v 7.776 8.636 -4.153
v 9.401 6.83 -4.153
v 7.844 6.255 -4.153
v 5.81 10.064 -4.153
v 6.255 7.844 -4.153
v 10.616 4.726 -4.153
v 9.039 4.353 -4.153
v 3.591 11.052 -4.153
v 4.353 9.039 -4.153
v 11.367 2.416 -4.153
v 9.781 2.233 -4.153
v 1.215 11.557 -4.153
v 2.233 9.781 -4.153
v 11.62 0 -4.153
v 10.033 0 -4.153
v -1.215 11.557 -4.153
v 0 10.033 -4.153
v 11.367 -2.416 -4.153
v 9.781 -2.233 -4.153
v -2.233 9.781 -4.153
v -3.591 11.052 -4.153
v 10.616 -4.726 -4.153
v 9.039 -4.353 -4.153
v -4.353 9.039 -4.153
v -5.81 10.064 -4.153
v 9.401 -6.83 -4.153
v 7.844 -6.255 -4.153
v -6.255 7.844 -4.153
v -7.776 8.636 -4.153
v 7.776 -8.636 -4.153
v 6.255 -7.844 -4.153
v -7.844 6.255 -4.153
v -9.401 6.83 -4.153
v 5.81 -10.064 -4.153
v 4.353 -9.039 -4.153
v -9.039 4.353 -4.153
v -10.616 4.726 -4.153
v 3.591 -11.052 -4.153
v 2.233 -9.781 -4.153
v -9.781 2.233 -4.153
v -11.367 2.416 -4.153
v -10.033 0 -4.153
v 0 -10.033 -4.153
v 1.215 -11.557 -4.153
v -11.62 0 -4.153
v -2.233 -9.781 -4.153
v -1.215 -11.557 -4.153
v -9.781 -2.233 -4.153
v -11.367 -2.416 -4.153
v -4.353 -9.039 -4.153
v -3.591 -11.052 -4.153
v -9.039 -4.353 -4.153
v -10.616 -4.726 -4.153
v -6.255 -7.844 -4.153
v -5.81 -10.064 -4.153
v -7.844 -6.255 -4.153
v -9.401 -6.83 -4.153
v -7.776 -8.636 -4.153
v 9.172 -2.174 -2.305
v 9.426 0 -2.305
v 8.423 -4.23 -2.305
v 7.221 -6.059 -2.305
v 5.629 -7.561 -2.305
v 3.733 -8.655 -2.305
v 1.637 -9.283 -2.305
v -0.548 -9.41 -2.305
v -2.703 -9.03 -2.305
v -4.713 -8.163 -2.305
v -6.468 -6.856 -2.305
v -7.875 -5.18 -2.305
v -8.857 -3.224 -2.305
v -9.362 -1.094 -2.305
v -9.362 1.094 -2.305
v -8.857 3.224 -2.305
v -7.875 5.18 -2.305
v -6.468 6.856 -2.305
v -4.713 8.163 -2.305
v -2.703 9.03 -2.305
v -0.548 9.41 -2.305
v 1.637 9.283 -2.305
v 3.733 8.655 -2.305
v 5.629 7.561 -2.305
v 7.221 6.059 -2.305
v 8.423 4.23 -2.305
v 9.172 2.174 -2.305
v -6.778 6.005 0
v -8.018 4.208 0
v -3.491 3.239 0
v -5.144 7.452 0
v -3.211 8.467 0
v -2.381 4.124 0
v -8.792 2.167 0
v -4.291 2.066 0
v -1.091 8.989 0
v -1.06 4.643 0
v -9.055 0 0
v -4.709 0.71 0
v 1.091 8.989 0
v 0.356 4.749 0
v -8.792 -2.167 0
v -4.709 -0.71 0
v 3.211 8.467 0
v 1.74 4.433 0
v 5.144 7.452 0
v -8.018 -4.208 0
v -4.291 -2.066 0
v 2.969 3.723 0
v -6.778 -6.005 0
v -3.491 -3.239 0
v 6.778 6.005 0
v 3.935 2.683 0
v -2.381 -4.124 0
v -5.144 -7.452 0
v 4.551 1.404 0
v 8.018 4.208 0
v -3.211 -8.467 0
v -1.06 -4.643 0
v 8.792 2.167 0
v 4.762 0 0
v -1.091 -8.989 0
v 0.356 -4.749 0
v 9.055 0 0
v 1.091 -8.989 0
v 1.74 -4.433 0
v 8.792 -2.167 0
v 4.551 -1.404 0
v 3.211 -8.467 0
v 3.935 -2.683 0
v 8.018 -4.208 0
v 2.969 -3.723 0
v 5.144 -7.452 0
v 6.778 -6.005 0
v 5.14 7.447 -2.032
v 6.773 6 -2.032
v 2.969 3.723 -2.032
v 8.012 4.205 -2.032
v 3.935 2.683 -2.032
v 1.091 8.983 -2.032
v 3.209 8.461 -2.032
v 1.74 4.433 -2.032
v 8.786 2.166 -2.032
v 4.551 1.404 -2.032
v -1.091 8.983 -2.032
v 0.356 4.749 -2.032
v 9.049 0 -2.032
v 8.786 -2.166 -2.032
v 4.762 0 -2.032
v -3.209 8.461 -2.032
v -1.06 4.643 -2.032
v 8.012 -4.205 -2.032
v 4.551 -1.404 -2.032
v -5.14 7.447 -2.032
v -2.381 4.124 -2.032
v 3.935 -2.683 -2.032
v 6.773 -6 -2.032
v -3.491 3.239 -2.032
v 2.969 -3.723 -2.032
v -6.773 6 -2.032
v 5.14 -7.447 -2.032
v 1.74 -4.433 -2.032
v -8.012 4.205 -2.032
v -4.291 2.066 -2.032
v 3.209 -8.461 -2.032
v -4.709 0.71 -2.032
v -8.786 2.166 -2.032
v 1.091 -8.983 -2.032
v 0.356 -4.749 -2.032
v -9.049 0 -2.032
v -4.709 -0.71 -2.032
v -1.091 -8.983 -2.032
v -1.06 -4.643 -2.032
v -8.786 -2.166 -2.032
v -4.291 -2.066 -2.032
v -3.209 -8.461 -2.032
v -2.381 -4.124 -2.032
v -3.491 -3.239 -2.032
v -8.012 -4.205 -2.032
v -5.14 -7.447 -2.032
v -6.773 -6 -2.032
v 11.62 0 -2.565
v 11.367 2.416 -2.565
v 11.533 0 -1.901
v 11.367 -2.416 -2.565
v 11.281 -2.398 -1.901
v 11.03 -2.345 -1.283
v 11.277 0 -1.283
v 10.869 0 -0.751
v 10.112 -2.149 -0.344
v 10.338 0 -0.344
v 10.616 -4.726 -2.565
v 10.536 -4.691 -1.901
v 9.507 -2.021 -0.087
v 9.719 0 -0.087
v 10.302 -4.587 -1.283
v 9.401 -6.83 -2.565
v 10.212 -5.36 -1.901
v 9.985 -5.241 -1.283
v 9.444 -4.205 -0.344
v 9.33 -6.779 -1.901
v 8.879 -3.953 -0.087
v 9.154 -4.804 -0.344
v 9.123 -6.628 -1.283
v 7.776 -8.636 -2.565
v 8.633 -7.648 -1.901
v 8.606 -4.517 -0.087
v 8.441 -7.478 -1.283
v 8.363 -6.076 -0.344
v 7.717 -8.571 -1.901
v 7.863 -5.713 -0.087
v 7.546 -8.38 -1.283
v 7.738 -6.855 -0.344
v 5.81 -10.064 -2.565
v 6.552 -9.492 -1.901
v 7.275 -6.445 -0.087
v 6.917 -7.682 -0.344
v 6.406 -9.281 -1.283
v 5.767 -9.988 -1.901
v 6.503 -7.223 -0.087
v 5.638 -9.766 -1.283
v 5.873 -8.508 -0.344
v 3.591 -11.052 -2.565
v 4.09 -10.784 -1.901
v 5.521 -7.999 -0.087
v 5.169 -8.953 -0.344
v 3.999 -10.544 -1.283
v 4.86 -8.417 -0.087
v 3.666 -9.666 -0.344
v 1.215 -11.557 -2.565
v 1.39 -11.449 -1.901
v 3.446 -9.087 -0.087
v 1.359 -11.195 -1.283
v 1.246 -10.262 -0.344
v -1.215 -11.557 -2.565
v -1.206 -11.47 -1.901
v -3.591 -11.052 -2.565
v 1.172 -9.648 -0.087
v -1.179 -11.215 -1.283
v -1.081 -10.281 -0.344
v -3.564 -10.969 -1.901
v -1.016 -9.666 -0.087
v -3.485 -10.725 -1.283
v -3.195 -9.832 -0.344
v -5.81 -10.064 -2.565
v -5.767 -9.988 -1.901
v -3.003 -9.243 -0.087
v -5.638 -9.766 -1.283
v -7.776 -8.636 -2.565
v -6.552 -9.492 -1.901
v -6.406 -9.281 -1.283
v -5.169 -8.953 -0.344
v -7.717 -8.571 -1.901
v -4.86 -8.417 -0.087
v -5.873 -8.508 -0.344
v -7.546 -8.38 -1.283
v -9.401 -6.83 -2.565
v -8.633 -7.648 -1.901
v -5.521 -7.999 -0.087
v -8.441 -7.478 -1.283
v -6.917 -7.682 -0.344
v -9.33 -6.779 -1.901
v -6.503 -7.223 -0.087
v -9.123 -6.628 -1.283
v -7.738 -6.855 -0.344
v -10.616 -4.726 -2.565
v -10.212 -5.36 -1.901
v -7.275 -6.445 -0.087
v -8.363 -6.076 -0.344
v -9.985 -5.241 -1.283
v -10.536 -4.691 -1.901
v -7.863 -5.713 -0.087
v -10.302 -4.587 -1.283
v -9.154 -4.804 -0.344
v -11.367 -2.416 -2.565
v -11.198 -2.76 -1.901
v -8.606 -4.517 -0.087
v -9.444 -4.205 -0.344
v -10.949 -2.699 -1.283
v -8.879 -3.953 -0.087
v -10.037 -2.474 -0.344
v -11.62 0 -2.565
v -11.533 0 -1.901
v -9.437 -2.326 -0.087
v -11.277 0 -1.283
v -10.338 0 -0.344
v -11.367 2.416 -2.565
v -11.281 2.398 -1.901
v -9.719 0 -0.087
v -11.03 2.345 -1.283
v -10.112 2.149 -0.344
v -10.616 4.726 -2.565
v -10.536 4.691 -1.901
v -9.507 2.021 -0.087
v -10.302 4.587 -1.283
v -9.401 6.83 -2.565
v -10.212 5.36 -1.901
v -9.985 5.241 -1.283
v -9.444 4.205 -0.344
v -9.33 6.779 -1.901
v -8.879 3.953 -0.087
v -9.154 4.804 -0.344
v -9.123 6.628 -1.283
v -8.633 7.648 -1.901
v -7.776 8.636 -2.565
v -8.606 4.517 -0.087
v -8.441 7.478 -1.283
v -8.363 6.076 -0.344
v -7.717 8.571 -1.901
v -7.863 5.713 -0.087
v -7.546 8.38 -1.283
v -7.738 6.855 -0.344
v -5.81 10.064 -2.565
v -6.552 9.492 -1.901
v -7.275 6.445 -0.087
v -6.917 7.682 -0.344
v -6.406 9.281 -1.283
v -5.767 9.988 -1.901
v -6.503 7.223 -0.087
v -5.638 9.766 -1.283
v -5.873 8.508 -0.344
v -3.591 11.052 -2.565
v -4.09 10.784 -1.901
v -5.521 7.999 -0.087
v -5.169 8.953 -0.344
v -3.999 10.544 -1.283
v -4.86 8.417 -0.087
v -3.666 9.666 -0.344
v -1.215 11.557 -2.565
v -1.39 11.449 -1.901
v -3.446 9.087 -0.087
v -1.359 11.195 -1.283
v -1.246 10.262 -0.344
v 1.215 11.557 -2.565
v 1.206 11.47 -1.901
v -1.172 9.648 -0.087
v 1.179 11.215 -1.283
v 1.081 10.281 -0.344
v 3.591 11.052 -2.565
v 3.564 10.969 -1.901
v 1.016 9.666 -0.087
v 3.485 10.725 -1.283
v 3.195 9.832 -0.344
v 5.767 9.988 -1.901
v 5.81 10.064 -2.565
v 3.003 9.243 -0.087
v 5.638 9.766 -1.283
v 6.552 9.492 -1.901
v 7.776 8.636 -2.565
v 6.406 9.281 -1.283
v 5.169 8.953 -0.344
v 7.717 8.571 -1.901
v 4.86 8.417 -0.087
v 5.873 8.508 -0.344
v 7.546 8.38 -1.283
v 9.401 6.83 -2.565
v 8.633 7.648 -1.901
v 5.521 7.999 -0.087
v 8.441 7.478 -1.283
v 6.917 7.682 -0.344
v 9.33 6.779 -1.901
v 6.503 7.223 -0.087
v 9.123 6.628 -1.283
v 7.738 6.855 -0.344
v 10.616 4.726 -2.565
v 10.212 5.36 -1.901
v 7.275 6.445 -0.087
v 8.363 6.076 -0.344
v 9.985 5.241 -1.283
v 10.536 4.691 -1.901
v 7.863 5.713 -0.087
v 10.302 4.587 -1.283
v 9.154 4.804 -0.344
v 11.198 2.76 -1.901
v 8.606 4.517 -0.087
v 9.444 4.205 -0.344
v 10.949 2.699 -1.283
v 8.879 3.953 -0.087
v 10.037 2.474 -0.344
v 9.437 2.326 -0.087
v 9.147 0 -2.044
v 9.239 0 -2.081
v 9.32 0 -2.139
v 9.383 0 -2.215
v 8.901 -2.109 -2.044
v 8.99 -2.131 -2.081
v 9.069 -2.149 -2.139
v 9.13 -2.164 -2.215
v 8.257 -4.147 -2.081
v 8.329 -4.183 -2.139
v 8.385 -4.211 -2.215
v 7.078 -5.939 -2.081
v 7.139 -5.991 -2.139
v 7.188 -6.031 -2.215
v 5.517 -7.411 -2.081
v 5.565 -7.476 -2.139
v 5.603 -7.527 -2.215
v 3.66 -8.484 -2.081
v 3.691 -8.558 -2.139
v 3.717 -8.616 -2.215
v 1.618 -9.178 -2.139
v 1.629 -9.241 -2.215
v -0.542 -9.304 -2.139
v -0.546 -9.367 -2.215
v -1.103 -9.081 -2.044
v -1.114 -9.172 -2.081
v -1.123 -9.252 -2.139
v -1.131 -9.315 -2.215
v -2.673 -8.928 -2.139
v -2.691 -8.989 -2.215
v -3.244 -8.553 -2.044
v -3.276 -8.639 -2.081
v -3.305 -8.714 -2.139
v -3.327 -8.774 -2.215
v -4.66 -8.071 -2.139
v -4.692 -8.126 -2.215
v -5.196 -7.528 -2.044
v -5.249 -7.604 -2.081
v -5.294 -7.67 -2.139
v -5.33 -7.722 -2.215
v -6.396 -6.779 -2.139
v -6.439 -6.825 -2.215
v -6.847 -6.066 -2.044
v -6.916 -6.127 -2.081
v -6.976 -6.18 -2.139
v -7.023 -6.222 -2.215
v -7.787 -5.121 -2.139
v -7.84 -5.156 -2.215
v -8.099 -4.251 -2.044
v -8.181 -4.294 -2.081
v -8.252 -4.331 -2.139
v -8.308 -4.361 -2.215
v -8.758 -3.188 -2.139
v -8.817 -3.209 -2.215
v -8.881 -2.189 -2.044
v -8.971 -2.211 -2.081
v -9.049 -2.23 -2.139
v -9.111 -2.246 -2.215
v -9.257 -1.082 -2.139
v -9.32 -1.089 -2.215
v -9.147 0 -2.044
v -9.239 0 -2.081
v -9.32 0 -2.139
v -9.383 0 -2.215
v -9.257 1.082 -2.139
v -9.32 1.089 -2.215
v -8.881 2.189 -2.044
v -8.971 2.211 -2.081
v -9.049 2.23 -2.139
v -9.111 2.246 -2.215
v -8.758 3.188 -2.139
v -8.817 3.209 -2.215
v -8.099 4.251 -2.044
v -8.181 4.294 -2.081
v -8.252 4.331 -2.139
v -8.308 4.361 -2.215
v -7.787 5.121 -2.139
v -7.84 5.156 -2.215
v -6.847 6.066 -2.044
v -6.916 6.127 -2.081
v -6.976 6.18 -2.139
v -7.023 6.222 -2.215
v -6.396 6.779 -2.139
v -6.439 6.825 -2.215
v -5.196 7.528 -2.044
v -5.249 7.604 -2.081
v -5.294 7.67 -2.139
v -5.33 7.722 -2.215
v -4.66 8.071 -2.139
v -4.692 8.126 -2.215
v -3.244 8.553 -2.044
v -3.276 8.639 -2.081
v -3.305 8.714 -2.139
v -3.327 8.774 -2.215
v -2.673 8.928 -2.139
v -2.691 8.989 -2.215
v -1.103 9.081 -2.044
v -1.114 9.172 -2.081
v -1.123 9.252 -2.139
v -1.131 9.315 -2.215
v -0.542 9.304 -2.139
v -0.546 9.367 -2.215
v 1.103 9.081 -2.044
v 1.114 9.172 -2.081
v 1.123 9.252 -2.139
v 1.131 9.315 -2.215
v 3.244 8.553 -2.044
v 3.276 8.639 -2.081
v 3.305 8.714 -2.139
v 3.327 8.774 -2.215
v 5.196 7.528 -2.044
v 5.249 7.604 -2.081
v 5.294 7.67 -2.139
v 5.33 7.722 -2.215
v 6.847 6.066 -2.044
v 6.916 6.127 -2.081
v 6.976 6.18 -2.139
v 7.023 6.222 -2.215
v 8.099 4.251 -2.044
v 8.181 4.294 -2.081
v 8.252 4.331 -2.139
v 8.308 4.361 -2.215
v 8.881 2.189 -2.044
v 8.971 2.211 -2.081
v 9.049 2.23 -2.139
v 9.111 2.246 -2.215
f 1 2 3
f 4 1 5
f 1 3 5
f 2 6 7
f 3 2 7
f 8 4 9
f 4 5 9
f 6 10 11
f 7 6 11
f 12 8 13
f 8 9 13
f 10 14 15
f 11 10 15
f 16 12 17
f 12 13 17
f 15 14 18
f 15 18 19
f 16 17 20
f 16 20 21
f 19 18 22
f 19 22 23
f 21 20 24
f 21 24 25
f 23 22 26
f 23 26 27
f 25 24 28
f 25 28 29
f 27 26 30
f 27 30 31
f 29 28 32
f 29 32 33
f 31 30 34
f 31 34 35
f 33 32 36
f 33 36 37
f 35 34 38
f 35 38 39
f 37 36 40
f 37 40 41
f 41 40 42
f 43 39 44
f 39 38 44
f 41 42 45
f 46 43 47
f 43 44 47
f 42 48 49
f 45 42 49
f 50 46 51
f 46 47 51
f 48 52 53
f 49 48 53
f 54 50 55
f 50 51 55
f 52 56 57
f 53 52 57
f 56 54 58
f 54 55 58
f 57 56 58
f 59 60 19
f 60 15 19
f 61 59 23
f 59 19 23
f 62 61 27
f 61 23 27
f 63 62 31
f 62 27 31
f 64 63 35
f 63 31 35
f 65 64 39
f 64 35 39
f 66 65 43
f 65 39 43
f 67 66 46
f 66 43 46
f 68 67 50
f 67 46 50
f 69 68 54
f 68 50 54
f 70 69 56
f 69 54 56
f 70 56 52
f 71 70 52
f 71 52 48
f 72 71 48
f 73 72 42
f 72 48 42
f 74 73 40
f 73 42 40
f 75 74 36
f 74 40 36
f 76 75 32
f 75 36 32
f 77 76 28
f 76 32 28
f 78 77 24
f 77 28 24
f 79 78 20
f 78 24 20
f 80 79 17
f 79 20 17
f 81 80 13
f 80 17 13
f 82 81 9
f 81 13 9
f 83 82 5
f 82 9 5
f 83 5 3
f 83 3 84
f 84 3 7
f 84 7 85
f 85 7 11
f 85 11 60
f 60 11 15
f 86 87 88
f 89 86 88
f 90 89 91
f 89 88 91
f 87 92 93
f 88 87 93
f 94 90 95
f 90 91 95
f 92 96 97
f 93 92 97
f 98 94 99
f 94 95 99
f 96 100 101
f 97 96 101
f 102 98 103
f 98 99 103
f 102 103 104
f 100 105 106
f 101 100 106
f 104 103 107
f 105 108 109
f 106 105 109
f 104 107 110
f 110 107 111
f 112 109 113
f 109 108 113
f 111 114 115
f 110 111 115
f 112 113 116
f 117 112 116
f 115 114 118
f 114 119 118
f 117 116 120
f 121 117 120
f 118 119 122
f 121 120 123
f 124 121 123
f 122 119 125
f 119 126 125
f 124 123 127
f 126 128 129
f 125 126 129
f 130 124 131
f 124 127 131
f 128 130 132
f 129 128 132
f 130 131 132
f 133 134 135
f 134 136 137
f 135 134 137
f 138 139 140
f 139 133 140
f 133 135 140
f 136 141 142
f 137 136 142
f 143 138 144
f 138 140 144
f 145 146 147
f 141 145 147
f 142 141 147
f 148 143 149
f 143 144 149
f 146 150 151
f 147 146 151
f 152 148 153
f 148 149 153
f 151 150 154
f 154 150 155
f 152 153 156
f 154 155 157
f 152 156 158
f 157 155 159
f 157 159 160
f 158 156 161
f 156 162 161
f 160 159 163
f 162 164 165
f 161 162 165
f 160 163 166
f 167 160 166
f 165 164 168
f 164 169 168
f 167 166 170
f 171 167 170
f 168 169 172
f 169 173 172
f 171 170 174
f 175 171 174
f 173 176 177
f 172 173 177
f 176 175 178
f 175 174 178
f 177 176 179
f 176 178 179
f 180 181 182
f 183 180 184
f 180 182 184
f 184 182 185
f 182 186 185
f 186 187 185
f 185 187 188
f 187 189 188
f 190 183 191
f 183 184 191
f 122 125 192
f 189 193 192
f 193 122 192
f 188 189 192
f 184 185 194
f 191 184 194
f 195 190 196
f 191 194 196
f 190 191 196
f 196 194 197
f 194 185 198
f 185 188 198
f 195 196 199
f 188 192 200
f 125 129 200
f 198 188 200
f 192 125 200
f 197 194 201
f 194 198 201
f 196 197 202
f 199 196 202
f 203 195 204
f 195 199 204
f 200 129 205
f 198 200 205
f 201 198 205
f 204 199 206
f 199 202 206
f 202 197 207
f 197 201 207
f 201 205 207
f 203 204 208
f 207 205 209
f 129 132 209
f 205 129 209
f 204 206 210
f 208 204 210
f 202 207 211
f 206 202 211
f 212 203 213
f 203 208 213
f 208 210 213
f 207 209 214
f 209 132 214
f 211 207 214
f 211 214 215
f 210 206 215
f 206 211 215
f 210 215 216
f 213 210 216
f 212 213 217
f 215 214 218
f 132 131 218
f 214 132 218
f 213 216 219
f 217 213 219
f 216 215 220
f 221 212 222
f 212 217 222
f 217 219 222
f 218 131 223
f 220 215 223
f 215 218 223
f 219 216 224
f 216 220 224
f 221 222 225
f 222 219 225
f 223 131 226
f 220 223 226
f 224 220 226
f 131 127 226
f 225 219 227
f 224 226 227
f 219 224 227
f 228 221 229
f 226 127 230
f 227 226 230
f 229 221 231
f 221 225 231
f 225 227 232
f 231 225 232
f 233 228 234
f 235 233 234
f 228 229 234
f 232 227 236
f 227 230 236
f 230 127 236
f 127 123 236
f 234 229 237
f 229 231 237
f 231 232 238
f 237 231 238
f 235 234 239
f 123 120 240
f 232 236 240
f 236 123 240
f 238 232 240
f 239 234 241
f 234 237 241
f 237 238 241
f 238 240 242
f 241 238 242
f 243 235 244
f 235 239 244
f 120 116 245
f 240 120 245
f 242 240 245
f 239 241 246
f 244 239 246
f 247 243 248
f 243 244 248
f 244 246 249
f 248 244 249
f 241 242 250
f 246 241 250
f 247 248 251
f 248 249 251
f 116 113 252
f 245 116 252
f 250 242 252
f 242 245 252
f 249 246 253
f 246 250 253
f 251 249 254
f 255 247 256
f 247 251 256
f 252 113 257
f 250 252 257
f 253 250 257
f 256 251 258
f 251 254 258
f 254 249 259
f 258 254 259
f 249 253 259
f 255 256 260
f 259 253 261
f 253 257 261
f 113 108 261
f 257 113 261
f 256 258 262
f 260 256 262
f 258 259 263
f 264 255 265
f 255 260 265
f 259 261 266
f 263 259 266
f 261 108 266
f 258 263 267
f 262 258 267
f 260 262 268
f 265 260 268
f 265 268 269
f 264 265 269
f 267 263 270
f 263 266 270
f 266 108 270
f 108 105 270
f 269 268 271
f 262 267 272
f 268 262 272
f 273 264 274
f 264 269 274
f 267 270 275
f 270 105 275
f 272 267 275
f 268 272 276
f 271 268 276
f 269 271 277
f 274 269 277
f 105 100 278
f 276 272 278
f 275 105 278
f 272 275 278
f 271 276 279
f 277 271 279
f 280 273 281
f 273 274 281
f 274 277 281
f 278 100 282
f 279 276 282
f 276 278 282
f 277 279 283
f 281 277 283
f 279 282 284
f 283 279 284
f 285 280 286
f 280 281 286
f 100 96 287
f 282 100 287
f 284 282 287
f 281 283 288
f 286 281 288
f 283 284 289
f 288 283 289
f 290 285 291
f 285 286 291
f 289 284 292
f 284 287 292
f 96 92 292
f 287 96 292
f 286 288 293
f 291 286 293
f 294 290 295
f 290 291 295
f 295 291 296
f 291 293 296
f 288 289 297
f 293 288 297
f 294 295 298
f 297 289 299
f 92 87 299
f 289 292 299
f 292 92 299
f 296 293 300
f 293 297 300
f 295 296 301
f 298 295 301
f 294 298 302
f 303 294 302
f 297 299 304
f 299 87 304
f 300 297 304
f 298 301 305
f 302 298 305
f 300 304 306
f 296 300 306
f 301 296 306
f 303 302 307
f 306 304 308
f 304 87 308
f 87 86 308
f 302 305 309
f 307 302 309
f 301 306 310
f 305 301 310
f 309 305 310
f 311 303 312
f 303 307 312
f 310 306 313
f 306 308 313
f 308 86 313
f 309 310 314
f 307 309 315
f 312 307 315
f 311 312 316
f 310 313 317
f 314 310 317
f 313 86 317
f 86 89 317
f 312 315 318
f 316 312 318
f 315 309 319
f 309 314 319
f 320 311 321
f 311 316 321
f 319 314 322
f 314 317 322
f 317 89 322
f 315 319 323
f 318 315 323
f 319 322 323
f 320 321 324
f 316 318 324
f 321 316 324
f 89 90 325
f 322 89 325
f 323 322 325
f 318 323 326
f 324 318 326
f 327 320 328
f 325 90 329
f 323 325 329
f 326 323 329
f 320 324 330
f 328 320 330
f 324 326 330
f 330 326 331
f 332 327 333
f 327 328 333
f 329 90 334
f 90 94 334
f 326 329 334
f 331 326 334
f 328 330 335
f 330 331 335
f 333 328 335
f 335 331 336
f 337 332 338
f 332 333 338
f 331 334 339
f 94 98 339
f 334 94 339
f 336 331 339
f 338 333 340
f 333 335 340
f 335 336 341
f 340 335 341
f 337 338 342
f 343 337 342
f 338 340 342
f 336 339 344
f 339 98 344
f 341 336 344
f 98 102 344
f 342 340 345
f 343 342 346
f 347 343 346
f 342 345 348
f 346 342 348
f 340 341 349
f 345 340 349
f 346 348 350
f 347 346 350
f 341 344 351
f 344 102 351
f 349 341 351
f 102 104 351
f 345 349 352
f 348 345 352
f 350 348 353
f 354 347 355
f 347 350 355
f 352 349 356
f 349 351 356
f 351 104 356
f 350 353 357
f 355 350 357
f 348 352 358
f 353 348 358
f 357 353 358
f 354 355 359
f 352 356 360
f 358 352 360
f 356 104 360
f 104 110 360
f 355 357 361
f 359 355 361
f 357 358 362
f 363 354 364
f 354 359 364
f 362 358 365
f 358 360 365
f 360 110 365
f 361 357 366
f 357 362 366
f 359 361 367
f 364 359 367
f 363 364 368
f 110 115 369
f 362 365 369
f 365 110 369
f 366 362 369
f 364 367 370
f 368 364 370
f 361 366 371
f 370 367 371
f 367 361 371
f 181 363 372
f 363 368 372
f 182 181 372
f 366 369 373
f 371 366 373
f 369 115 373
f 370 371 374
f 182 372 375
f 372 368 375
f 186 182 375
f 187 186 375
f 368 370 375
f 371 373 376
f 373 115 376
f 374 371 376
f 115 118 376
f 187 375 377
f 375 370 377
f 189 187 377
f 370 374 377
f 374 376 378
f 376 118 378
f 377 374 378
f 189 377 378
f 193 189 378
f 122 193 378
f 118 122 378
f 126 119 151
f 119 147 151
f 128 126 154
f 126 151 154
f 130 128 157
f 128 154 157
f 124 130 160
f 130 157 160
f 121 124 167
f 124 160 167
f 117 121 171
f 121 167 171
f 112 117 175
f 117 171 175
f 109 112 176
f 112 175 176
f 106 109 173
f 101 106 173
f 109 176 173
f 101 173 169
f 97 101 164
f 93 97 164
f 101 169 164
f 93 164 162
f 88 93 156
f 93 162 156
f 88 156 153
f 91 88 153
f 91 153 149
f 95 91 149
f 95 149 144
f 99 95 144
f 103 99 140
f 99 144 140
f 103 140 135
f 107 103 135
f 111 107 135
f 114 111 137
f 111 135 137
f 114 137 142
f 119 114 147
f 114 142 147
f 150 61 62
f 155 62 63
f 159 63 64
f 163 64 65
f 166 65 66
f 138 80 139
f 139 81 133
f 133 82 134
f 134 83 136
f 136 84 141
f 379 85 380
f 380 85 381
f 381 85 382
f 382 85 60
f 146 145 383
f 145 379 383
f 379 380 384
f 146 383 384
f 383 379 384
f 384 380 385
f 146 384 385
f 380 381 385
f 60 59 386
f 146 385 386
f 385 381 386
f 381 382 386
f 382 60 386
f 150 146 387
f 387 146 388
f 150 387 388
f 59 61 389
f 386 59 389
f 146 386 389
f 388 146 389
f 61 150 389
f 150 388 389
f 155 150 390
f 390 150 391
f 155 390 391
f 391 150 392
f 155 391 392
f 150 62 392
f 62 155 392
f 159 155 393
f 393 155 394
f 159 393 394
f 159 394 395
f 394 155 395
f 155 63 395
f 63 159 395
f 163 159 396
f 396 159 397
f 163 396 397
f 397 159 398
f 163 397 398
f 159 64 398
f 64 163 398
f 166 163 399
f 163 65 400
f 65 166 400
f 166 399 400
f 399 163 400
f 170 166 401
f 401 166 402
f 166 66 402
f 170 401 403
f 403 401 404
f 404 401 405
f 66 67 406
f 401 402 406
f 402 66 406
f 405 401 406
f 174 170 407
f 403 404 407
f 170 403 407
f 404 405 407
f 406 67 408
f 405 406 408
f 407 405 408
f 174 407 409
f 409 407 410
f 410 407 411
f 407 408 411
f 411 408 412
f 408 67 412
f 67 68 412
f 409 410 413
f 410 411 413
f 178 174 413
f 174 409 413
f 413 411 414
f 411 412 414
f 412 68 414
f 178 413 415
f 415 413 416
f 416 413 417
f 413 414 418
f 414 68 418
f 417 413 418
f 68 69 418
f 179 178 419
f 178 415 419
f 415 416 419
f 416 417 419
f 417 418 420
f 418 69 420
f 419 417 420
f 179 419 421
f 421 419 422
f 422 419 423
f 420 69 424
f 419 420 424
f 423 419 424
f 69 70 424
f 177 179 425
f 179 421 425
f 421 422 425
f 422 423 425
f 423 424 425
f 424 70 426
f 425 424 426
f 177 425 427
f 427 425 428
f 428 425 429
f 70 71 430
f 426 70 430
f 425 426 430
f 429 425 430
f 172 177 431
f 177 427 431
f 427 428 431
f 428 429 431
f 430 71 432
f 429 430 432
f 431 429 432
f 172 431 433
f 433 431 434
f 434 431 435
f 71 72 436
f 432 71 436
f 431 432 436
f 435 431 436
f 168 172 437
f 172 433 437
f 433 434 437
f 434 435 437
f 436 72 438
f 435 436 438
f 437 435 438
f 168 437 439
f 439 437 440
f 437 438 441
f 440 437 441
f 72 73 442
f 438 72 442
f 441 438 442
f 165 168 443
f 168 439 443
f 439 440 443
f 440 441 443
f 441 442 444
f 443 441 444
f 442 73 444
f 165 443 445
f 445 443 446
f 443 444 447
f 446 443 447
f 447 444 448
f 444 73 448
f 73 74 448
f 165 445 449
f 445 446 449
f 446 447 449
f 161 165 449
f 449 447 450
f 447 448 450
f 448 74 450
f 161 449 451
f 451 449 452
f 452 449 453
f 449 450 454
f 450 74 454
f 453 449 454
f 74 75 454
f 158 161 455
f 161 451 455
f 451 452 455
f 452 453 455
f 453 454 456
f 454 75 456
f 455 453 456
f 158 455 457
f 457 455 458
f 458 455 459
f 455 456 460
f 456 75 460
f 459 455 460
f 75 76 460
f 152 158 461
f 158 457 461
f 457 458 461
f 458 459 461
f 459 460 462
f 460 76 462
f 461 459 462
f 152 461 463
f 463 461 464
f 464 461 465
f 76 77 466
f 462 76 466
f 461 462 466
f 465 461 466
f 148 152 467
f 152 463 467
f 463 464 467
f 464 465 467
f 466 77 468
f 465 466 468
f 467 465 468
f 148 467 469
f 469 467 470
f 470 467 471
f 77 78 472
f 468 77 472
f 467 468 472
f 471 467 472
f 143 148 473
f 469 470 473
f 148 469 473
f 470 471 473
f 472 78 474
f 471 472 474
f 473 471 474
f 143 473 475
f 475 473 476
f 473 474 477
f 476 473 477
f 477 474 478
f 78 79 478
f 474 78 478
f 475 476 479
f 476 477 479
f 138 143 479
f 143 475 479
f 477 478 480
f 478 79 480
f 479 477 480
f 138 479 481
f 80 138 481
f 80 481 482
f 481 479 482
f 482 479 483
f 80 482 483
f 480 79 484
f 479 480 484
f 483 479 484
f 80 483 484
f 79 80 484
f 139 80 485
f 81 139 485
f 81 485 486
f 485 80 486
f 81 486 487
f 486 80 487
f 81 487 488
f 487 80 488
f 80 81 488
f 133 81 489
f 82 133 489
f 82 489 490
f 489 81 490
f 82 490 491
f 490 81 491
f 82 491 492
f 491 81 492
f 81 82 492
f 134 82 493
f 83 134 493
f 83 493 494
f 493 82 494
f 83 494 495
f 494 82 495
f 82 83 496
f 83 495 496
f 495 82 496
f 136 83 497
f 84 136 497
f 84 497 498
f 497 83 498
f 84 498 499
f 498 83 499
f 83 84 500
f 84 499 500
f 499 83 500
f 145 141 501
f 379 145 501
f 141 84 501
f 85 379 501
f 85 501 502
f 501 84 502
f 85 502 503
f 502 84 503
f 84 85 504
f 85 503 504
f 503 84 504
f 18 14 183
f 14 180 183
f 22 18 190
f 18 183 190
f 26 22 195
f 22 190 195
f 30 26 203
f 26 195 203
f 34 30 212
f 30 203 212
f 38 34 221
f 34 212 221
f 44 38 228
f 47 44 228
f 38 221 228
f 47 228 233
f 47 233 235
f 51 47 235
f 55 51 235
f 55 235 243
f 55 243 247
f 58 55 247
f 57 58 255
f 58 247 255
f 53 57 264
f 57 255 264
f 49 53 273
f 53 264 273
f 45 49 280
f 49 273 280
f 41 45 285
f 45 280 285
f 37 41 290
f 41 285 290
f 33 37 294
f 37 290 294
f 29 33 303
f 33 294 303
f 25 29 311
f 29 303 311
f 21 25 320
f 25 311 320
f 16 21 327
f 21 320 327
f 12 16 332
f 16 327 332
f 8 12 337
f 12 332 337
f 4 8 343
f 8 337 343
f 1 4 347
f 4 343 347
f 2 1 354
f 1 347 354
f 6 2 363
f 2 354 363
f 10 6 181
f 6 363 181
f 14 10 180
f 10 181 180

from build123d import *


with BuildPart() as part:
    # Sketch1 → Revolve1 (revolve)
    with BuildSketch(Plane(origin=(0, 0, 0), x_dir=(1, 0, 0), z_dir=(0, 1, 0))):
        with BuildLine():
            ThreePointArc((9.04875, 2.032), (9.281494477, 2.107409957), (9.425791706, 2.304982636))
            Line((9.425791706, 2.304982636), (10.033, 4.1529))
            Line((10.033, 4.1529), (11.6205, 4.1529))
            Line((11.6205, 4.1529), (11.6205, 2.5654))
            ThreePointArc((11.6205, 2.5654), (10.869111736, 0.751388264), (9.0551, 0))
            Line((9.0551, 0), (4.7625, 0))
            Line((4.7625, 0), (4.7625, 2.032))
            Line((4.7625, 2.032), (9.04875, 2.032))
        make_face()
    revolve(axis=Axis((0, 0, 0), (0, 0, -1)))


solid = part.part
